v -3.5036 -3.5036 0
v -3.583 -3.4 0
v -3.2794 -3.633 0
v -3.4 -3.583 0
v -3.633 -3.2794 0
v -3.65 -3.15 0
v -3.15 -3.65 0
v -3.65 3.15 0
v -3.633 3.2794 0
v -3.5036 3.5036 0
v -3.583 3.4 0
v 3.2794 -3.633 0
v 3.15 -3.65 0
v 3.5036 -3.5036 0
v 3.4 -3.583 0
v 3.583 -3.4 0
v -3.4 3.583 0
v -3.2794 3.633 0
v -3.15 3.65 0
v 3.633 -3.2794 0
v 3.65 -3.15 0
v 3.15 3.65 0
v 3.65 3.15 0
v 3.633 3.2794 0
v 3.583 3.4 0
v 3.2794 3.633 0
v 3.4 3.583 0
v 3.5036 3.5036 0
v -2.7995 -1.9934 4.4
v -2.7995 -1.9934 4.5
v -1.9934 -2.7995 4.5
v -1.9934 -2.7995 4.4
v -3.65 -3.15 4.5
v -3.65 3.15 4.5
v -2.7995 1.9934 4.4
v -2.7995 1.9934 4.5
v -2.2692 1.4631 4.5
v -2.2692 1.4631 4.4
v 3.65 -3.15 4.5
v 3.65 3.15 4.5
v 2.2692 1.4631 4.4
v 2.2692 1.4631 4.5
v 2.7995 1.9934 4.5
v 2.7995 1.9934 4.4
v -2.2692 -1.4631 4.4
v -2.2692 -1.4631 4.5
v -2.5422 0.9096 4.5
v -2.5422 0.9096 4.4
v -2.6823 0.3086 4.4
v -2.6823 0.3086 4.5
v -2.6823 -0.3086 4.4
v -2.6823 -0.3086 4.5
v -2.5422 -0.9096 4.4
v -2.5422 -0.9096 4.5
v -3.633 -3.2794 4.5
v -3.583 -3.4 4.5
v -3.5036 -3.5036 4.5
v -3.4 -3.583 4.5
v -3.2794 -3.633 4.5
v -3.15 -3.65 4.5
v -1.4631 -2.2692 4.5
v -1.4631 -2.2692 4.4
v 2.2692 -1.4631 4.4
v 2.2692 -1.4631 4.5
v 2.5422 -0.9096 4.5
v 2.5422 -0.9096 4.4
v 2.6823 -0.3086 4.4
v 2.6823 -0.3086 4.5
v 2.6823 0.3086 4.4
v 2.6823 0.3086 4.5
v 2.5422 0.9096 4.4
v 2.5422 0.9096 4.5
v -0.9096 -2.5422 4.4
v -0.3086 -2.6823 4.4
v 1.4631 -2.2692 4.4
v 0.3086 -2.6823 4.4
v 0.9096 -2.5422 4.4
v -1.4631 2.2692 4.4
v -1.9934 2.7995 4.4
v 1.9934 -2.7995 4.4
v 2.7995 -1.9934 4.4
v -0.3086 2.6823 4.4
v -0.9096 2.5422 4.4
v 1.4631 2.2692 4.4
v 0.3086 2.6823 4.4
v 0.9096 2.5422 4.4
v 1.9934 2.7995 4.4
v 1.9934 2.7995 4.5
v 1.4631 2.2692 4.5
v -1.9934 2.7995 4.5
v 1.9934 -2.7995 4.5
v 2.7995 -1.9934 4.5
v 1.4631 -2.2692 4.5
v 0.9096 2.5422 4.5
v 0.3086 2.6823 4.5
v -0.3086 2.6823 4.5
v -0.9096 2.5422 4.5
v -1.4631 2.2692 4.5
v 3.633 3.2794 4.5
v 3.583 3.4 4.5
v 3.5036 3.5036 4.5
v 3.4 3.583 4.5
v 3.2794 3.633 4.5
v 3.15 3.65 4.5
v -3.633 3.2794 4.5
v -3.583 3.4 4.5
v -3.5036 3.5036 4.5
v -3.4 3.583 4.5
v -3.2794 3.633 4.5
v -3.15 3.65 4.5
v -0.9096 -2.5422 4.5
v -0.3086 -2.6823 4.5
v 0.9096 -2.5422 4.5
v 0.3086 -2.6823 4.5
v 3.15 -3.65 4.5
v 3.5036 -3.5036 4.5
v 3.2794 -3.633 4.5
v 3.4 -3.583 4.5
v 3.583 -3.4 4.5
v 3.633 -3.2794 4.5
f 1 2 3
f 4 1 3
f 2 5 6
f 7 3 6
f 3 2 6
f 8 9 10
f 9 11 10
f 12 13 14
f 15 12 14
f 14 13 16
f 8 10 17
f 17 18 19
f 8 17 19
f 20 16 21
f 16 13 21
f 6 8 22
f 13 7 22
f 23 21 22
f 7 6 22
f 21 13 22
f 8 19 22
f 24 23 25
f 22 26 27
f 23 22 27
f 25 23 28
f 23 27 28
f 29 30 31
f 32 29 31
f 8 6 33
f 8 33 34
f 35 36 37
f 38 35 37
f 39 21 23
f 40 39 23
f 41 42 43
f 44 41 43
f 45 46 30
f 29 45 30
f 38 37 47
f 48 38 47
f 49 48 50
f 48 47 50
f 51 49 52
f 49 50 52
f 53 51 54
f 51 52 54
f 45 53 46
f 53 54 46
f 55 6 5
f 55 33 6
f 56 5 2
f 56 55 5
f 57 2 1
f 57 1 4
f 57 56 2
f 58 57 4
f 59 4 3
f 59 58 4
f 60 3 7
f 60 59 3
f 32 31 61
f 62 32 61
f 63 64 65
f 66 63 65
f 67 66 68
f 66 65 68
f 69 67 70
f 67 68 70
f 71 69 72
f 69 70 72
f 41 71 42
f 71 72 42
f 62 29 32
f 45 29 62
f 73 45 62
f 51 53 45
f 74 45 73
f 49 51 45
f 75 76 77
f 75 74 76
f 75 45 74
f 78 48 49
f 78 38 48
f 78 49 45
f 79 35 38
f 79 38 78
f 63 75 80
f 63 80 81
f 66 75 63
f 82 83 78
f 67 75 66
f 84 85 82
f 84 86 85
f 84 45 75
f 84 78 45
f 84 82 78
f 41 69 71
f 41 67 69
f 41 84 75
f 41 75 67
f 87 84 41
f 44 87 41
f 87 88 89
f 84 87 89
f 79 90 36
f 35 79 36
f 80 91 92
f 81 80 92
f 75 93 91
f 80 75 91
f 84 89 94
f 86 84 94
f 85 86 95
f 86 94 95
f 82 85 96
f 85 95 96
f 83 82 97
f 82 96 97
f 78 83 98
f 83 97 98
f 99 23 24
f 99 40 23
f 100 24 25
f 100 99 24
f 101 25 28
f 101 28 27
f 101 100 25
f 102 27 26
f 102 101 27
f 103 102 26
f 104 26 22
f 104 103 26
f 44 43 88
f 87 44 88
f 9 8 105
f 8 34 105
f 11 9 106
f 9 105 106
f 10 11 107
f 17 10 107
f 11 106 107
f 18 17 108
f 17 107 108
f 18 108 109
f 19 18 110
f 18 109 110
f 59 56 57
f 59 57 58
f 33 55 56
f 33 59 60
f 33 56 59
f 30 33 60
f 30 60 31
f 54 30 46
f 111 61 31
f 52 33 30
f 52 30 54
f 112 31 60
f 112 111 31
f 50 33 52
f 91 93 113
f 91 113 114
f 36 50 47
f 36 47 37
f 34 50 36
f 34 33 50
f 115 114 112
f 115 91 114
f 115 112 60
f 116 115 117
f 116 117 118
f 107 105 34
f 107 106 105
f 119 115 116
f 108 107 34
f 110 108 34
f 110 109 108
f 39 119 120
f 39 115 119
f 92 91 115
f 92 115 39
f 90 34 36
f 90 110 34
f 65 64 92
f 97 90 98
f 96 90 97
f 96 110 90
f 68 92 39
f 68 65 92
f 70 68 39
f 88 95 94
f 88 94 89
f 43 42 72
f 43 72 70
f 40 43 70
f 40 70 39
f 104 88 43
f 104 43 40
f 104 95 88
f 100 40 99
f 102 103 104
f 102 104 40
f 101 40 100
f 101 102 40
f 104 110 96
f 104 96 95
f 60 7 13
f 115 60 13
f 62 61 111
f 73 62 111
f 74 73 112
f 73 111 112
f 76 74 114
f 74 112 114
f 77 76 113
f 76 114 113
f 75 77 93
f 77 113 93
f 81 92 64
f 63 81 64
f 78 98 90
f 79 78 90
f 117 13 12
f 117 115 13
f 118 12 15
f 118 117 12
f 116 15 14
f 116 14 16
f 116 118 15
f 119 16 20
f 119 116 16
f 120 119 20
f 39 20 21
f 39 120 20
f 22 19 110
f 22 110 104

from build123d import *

# Parameters (mm, degrees)
SKETCH_1_W               = 7.3
SKETCH_1_H               = 7.3
EXTRUDE_1_DEPTH          = 4.5
FILLET_1_R               = 0.5
SKETCH_2_R               = 2.7
CUT_EXTRUDE_1_DEPTH      = 0.1
CUT_EXTRUDE_2_DEPTH      = 0.1
PATTERN_CIRCULAR_1_COUNT = 4


with BuildPart() as part:
    # Эскиз1 → Бобышка-Вытянуть1 (new body)
    with BuildSketch(Plane.XY):
        Rectangle(SKETCH_1_W, SKETCH_1_H)
    extrude(amount=EXTRUDE_1_DEPTH)

    # Скругление1
    fillet_1_edges = [part.edges().sort_by_distance(p)[0] for p in [
        (3.65, -3.65, 2.25),
        (-3.65, -3.65, 2.25),
        (-3.65, 3.65, 2.25),
        (3.65, 3.65, 2.25),
    ]]
    fillet(fillet_1_edges, radius=FILLET_1_R)

    # Эскиз2 → Вырез-Вытянуть1 (cut)
    with BuildSketch(Plane.XY.offset(4.5)):
        Circle(SKETCH_2_R)
    extrude(amount=-CUT_EXTRUDE_1_DEPTH, mode=Mode.SUBTRACT)

    # Эскиз3 → Вырез-Вытянуть2 (cut)
    with BuildSketch(Plane.XY.offset(4.5)):
        Polygon((-2.799540108, 1.993438378), (-2.269210022, 1.463108292), (-1.463108292, 2.269210022), (-1.993438378, 2.799540108), align=None)
    cut_extrude_2 = extrude(amount=-CUT_EXTRUDE_2_DEPTH, mode=Mode.SUBTRACT)

    # Круговой массив1: Вырез-Вытянуть2 ×4 about axis
    pattern_circular_1_axis = Axis((0, 0, 0), (0, 0, 1))
    for i in range(1, PATTERN_CIRCULAR_1_COUNT):
        add(cut_extrude_2.rotate(pattern_circular_1_axis, i * 360 / PATTERN_CIRCULAR_1_COUNT), mode=Mode.SUBTRACT)


solid = part.part
